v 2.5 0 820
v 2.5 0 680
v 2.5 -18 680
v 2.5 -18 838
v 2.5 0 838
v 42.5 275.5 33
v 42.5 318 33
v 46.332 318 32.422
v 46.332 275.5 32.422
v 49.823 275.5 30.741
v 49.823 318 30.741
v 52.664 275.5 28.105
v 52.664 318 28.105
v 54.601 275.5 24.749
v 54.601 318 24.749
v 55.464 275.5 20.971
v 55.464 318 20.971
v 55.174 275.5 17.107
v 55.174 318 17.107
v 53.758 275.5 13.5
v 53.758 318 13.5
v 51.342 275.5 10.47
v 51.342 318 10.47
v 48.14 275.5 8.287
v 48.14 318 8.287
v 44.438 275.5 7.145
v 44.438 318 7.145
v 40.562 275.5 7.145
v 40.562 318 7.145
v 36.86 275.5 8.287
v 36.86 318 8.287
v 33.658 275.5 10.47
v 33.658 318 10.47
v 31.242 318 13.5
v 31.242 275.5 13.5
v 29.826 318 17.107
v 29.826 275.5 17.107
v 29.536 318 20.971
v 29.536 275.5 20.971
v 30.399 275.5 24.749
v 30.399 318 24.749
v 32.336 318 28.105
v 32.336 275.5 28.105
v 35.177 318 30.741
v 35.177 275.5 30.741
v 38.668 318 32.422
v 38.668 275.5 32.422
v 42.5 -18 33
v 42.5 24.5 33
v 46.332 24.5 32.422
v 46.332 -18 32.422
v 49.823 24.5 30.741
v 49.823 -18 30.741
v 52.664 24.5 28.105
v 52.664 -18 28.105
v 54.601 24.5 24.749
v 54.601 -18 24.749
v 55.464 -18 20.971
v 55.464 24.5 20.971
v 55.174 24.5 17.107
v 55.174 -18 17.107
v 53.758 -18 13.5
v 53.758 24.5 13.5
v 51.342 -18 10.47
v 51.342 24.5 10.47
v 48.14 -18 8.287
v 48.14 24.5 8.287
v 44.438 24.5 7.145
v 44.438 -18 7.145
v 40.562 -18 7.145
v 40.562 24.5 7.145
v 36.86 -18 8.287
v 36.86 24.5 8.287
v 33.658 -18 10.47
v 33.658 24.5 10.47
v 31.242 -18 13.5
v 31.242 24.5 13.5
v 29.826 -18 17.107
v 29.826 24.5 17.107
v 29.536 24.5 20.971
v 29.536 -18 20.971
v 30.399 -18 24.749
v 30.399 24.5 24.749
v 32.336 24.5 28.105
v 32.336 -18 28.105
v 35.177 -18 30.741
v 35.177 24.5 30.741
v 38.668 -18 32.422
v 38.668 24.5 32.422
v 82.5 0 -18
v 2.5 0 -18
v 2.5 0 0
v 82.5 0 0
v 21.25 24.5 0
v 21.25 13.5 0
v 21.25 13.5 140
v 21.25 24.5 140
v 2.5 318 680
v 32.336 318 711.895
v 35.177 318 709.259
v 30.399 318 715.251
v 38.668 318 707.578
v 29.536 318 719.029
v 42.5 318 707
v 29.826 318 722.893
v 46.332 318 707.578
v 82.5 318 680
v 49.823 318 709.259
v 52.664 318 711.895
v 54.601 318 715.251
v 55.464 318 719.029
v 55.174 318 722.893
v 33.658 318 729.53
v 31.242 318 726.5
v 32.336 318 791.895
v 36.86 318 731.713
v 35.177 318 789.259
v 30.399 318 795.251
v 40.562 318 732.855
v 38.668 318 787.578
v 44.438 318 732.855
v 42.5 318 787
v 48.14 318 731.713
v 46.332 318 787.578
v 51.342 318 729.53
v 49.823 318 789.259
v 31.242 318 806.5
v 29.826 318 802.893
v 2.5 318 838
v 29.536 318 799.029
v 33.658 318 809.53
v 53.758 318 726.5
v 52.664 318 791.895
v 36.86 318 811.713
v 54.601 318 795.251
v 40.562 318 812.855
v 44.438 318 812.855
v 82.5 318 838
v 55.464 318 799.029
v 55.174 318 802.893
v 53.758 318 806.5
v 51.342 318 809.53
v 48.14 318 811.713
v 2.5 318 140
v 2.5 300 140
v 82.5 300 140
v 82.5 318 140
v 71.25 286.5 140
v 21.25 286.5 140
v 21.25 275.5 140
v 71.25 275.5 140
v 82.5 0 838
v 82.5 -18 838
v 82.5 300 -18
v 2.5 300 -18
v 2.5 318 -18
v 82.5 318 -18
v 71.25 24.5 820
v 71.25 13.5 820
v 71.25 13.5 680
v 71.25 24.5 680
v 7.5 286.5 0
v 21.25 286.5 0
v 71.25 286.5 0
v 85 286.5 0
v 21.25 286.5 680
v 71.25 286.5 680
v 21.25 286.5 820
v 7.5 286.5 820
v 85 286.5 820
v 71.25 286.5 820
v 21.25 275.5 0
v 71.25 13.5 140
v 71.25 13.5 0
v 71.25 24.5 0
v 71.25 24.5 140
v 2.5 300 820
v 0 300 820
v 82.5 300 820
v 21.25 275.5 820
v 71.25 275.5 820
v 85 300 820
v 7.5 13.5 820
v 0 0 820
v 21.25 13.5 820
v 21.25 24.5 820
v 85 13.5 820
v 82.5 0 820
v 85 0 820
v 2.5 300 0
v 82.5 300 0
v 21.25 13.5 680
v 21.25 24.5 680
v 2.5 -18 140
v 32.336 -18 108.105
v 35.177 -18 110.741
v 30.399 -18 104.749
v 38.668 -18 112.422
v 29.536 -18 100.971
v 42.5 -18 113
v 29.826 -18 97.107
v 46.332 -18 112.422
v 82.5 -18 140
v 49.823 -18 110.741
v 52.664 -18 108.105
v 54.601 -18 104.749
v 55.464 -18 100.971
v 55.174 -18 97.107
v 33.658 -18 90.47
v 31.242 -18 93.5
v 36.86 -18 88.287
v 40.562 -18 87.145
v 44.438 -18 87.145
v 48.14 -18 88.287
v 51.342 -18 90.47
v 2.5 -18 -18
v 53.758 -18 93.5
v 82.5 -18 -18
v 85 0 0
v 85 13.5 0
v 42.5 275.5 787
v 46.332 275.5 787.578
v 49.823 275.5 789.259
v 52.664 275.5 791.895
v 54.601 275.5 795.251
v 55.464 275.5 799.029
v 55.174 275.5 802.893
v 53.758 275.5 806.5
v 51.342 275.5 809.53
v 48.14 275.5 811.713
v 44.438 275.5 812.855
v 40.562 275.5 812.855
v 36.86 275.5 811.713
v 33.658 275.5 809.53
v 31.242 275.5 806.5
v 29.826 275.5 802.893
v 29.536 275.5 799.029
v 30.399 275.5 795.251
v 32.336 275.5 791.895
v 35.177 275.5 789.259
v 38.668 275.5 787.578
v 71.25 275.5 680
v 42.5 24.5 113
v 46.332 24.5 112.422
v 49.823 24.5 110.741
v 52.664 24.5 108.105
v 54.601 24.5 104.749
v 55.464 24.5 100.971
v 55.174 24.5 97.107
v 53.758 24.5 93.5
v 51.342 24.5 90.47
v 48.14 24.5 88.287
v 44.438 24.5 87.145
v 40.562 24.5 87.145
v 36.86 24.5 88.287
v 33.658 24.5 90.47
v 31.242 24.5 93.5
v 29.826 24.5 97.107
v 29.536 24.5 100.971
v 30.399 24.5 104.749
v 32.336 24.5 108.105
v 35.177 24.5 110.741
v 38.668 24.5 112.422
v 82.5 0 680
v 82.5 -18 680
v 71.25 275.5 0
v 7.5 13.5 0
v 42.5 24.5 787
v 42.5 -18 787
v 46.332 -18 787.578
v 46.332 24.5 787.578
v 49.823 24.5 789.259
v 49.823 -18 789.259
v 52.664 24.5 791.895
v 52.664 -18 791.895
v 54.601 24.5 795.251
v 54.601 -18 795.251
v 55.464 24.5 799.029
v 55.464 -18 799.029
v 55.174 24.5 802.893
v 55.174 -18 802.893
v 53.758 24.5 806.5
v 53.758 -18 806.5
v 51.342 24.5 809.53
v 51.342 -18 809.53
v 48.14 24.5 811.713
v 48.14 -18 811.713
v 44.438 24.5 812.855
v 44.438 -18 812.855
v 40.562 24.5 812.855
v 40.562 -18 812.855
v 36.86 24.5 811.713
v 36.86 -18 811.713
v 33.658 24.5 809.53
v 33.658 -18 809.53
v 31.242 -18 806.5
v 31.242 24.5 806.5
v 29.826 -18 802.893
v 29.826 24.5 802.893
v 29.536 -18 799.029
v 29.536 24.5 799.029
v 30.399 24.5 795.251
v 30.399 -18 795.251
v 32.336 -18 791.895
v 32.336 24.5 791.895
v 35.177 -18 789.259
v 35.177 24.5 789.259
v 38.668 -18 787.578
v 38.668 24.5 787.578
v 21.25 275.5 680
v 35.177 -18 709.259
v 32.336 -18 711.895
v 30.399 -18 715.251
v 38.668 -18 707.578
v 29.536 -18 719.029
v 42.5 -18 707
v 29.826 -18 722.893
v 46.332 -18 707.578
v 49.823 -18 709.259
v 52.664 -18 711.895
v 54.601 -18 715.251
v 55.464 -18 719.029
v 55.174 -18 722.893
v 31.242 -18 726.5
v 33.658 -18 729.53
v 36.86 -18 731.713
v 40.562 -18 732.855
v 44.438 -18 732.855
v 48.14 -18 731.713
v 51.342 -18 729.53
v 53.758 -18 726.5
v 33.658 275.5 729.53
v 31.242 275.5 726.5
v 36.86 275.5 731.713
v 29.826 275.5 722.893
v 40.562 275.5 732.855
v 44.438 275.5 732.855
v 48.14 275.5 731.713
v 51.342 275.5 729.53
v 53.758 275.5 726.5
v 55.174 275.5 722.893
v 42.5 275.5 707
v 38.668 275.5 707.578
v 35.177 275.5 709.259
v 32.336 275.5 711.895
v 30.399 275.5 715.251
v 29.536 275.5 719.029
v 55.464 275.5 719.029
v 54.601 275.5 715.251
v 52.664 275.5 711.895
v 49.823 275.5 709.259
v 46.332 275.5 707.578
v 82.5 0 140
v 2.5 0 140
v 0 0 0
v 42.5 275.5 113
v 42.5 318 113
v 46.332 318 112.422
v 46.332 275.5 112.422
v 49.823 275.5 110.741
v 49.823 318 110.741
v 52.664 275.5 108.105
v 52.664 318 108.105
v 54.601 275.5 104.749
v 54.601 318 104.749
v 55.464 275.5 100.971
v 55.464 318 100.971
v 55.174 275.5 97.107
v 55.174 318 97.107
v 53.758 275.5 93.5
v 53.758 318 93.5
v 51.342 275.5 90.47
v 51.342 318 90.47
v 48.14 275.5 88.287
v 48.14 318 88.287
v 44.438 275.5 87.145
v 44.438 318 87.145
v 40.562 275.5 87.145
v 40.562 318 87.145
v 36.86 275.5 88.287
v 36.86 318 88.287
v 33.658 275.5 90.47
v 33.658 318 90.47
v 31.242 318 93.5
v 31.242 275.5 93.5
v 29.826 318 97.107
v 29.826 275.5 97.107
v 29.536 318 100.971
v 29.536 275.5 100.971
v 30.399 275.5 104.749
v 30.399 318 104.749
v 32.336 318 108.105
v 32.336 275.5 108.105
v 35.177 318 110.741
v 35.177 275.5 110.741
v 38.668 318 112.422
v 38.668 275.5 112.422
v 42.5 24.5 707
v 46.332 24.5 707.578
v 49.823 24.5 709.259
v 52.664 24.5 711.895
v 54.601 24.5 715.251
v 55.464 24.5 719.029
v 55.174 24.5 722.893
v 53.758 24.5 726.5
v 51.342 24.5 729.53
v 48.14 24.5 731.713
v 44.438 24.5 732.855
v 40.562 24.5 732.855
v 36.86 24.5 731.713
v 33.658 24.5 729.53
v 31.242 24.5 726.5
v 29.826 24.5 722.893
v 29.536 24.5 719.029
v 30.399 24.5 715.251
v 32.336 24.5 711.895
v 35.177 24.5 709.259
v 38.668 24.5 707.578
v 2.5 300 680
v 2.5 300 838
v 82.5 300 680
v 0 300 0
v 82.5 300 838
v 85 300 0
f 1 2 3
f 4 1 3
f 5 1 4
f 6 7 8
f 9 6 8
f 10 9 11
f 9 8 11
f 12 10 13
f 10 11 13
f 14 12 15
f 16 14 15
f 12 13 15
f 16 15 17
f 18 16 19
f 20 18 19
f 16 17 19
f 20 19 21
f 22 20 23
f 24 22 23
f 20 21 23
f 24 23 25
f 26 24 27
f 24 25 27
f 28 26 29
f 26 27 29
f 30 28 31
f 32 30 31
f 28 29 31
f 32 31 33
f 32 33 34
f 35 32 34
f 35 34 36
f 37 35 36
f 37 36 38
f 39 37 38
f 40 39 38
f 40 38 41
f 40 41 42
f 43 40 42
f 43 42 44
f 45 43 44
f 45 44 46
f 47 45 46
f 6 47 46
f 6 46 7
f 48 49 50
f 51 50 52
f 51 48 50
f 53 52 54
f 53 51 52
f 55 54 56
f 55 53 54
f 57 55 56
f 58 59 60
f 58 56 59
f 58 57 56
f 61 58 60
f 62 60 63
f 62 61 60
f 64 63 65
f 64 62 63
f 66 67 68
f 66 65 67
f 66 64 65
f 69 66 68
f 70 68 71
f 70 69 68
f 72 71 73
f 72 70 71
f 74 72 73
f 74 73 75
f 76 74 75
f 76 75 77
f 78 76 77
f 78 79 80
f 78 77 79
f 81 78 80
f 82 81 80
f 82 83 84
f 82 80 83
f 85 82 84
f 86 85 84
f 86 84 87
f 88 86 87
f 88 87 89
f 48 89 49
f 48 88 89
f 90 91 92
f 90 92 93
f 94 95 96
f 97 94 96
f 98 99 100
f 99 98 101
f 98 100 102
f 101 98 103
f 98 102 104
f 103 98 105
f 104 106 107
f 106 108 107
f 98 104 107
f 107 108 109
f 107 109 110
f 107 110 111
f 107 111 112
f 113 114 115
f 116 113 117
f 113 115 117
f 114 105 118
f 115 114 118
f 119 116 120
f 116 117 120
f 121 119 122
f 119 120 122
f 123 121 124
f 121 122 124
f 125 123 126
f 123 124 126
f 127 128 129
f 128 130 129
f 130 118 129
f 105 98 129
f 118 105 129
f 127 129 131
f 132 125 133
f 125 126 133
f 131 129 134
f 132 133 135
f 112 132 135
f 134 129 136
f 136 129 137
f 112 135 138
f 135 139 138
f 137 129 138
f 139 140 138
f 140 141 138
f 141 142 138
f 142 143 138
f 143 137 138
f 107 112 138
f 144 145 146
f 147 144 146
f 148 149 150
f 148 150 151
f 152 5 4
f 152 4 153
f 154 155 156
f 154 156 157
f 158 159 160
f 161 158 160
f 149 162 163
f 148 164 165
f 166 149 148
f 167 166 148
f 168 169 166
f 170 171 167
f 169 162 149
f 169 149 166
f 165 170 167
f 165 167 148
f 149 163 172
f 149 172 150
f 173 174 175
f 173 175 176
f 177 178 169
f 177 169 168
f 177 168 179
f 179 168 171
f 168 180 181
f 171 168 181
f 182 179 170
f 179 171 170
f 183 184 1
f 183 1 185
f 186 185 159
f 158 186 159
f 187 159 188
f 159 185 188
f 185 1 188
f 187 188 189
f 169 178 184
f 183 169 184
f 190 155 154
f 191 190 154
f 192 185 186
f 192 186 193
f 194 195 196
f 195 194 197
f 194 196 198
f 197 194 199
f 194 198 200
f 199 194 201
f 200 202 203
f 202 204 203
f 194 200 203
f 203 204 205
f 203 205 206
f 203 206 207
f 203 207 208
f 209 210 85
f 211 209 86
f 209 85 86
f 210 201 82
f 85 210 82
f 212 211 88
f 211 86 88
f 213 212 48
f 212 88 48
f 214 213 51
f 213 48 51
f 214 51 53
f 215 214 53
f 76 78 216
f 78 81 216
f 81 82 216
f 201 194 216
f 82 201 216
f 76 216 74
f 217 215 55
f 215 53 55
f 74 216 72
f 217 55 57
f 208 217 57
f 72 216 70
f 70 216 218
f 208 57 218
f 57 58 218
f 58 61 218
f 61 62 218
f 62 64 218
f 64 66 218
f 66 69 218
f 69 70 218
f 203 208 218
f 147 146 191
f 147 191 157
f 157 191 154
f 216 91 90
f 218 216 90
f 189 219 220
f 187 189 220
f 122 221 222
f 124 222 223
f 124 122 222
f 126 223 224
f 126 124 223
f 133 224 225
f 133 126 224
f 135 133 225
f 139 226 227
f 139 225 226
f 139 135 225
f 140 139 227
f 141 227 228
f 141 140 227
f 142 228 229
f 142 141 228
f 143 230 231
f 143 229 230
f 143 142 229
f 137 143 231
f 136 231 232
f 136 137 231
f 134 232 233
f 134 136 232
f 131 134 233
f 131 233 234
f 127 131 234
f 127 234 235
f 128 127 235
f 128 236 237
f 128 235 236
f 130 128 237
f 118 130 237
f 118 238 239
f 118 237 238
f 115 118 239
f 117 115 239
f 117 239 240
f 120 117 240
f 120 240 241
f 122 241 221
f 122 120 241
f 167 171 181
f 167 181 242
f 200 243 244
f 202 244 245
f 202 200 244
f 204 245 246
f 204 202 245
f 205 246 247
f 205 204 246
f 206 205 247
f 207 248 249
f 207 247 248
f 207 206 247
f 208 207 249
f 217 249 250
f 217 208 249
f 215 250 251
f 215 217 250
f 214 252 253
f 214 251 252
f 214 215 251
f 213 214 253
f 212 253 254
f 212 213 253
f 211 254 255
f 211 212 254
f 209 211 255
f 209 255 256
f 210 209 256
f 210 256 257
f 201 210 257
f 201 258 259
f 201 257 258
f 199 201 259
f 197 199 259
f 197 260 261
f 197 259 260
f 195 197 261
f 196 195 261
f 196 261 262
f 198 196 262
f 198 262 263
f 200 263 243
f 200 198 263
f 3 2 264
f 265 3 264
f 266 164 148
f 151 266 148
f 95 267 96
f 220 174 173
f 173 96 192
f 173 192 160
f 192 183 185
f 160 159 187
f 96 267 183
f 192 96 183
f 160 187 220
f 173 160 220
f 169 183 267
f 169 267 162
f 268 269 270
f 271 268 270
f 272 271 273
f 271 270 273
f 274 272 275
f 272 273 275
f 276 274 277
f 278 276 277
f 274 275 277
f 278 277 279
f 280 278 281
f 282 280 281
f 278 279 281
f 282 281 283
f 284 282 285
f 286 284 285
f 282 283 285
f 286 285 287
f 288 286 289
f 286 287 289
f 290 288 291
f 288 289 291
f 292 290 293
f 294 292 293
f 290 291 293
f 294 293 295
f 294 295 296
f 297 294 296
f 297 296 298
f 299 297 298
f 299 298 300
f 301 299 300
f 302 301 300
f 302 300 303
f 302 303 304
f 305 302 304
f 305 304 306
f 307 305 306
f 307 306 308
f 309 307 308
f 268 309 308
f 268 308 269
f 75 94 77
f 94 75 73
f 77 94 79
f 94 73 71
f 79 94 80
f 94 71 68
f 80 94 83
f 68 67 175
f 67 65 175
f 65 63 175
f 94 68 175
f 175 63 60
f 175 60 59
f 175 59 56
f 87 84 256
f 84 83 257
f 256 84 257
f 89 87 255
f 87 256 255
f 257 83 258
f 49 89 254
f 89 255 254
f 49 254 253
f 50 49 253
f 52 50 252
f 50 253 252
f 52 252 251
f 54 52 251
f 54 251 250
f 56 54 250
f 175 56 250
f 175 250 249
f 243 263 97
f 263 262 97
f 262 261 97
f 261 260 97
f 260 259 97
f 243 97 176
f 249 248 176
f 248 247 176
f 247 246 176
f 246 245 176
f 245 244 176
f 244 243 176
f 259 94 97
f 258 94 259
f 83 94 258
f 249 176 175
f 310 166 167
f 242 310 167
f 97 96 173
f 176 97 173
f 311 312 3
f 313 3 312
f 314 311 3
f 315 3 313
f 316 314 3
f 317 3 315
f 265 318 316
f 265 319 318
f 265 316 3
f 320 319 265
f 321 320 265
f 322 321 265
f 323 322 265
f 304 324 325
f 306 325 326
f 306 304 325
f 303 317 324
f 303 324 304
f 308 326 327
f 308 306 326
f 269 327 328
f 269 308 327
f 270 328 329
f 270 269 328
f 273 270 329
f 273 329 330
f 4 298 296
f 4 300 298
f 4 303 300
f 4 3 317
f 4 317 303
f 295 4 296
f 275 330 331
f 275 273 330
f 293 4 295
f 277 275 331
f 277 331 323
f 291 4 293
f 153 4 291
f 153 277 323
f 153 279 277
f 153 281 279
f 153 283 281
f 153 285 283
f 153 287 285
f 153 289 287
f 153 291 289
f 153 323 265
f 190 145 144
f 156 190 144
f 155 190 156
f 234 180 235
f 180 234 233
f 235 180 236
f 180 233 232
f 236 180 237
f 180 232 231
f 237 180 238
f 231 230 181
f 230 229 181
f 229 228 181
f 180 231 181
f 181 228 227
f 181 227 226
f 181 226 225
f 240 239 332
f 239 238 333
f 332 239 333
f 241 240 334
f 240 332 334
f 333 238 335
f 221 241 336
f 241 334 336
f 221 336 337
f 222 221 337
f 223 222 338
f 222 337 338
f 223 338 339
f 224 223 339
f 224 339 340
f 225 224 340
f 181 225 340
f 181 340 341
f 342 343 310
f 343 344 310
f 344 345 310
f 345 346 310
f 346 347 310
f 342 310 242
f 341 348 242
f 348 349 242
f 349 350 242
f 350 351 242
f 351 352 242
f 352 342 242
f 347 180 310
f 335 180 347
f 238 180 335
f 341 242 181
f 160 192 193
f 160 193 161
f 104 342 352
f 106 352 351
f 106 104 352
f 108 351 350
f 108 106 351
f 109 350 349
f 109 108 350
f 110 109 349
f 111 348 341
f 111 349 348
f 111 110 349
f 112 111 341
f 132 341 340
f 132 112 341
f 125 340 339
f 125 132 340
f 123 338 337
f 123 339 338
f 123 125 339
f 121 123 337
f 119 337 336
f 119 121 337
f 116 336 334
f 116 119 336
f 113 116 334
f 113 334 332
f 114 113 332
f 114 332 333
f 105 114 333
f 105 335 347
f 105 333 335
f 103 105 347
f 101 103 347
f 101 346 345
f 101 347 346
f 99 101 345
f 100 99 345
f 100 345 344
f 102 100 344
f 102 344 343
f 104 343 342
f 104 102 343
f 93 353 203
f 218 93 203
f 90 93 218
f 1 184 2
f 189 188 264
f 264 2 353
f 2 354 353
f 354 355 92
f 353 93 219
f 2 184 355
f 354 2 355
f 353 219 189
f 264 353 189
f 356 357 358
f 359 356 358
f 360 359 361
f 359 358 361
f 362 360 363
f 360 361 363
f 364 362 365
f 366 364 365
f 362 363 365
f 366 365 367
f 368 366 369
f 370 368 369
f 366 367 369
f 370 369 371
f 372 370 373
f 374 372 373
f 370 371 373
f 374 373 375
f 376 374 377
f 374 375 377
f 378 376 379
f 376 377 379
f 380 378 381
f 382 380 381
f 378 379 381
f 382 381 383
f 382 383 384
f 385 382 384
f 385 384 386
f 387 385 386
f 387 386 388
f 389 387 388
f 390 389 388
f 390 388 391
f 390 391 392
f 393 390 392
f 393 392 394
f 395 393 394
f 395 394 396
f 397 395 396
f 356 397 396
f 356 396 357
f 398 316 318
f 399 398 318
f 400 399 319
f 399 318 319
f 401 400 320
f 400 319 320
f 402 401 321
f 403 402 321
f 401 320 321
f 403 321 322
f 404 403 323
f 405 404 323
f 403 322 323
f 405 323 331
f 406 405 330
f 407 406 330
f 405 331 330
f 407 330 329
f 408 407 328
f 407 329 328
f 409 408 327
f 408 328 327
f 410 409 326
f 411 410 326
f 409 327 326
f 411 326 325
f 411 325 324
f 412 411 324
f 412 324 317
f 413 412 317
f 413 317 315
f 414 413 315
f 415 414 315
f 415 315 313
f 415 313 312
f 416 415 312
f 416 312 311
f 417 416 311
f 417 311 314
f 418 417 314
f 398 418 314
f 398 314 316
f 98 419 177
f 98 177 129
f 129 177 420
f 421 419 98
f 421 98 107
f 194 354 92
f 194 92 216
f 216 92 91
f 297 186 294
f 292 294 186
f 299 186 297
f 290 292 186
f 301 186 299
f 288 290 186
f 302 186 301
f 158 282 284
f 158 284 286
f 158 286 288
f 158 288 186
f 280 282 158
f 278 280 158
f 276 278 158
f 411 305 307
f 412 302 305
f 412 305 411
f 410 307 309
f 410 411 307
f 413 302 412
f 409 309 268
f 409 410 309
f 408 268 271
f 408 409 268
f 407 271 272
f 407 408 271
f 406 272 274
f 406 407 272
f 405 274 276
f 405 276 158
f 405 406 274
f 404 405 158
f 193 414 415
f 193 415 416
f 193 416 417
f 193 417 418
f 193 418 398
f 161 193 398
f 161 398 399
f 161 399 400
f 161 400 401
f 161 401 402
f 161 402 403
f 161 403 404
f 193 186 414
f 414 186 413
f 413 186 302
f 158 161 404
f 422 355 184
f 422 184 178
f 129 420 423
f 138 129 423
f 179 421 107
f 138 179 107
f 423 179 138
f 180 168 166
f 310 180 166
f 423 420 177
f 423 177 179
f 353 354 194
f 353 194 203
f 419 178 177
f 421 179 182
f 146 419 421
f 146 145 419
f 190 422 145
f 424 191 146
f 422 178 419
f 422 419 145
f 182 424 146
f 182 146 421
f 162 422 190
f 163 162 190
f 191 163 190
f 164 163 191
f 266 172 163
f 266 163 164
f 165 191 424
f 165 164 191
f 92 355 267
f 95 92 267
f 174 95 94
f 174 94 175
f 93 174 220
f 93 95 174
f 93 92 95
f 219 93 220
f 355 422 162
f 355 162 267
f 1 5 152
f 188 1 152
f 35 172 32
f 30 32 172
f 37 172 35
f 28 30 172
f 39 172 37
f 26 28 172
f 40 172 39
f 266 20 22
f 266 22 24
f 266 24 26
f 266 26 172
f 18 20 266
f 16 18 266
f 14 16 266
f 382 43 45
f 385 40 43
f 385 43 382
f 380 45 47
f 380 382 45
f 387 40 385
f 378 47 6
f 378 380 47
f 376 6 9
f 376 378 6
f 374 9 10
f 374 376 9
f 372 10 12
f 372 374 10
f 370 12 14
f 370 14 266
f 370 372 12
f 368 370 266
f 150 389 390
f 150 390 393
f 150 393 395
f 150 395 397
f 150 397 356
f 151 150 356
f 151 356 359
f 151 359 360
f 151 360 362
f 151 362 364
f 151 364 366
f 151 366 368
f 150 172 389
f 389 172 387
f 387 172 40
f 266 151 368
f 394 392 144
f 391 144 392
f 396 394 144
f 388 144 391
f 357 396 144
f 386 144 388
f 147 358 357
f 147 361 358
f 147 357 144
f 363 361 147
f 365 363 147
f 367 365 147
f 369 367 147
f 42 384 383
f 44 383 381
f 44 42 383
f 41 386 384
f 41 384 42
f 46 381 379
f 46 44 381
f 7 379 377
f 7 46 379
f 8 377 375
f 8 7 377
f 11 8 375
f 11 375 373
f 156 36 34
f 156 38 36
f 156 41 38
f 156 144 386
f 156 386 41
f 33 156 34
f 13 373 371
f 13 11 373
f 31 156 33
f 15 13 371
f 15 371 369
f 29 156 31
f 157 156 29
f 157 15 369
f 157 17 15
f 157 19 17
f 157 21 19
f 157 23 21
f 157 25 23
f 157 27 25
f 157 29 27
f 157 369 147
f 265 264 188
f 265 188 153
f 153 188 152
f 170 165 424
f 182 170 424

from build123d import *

# Parameters (mm, degrees)
SKETCH_1_W               = 85
SKETCH_1_H               = 300
EXTRUDE_1_DEPTH          = 820
SKETCH_2_W               = 77.5
SKETCH_2_H               = 273
CUT_EXTRUDE_1_DEPTH      = 878.282736636
SKETCH_5_W               = 50
SKETCH_5_H               = 140
EXTRUDE_3_DEPTH          = 11
SKETCH_6_W               = 80
SKETCH_6_H               = 158
EXTRUDE_4_DEPTH          = 18
SKETCH_8_R               = 13
CUT_EXTRUDE_3_DEPTH      = 884.600022635
MIRROR_4_COPY_1_SKETCH_W = 50
MIRROR_4_COPY_1_SKETCH_H = 140
MIRROR_4_COPY_1_DEPTH    = 11
MIRROR_4_COPY_2_SKETCH_W = 80
MIRROR_4_COPY_2_SKETCH_H = 158
MIRROR_4_COPY_2_DEPTH    = 18
MIRROR_4_COPY_3_SKETCH_R = 13
MIRROR_4_COPY_3_DEPTH    = 884.600022635


with BuildPart() as part:
    # 草图1 → 凸台-拉伸1 (new body)
    with BuildSketch(Plane.XY):
        with Locations((42.5, 150)):
            Rectangle(SKETCH_1_W, SKETCH_1_H)
    extrude(amount=EXTRUDE_1_DEPTH)

    # 草图2 → 切除-拉伸1 (cut, through all)
    with BuildSketch(Plane.XY.offset(820)):
        with Locations((46.25, 150)):
            Rectangle(SKETCH_2_W, SKETCH_2_H)
    extrude(amount=-CUT_EXTRUDE_1_DEPTH, mode=Mode.SUBTRACT)

    # 草图5 → 凸台-拉伸3 (add)
    with BuildSketch(Plane.XZ.offset(-286.5)):
        with Locations((46.25, 70)):
            Rectangle(SKETCH_5_W, SKETCH_5_H)
    extrude_3 = extrude(amount=EXTRUDE_3_DEPTH)

    # 草图6 → 凸台-拉伸4 (add)
    with BuildSketch(Plane(origin=(0, 300, 0), x_dir=(1, 0, 0), z_dir=(0, 1, 0))):
        with Locations((42.5, -61)):
            Rectangle(SKETCH_6_W, SKETCH_6_H)
    extrude_4 = extrude(amount=EXTRUDE_4_DEPTH)

    # 草图8 → 切除-拉伸3 (cut, through all)
    with BuildSketch(Plane(origin=(0, 318, 0), x_dir=(1, 0, 0), z_dir=(0, 1, 0))):
        with Locations(Location((42.5, -20, 0), (0, 0, 270))):
            Circle(SKETCH_8_R)
        with Locations(Location((42.5, -100, 0), (0, 0, 270))):
            Circle(SKETCH_8_R)
    cut_extrude_3 = extrude(amount=-CUT_EXTRUDE_3_DEPTH, mode=Mode.SUBTRACT)

    # 镜向3: 凸台-拉伸3, 凸台-拉伸4, 切除-拉伸3 across plane
    add(extrude_3.mirror(Plane(origin=(0, 150, 0), x_dir=(0, 0, 1), z_dir=(0, -1, 0))))
    add(extrude_4.mirror(Plane(origin=(0, 150, 0), x_dir=(0, 0, 1), z_dir=(0, -1, 0))))
    add(cut_extrude_3.mirror(Plane(origin=(0, 150, 0), x_dir=(0, 0, 1), z_dir=(0, -1, 0))), mode=Mode.SUBTRACT)

    # 镜向4: 凸台-拉伸3, 凸台-拉伸4, 切除-拉伸3 across plane
    add(extrude_3.mirror(Plane(origin=(0, 0, 410), x_dir=(1, 0, 0), z_dir=(0, 0, -1))))
    add(extrude_4.mirror(Plane(origin=(0, 0, 410), x_dir=(1, 0, 0), z_dir=(0, 0, -1))))
    add(cut_extrude_3.mirror(Plane(origin=(0, 0, 410), x_dir=(1, 0, 0), z_dir=(0, 0, -1))), mode=Mode.SUBTRACT)

    # 镜向4 copy 1 sketch → 镜向4 copy 1 (add)
    with BuildSketch(Plane(origin=(0, 13.5, 820), x_dir=(1, 0, 0), z_dir=(0, 1, 0))):
        with Locations((46.25, 70)):
            Rectangle(MIRROR_4_COPY_1_SKETCH_W, MIRROR_4_COPY_1_SKETCH_H)
    extrude(amount=MIRROR_4_COPY_1_DEPTH)

    # 镜向4 copy 2 sketch → 镜向4 copy 2 (add)
    with BuildSketch(Plane(origin=(0, 0, 820), x_dir=(1, 0, 0), z_dir=(0, -1, 0))):
        with Locations((42.5, -61)):
            Rectangle(MIRROR_4_COPY_2_SKETCH_W, MIRROR_4_COPY_2_SKETCH_H)
    extrude(amount=MIRROR_4_COPY_2_DEPTH)

    # 镜向4 copy 3 sketch → 镜向4 copy 3 (cut, through all)
    with BuildSketch(Plane(origin=(0, -18, 820), x_dir=(1, 0, 0), z_dir=(0, -1, 0))):
        with Locations(Location((42.5, -20, 0), (0, 0, 270))):
            Circle(MIRROR_4_COPY_3_SKETCH_R)
        with Locations(Location((42.5, -100, 0), (0, 0, 270))):
            Circle(MIRROR_4_COPY_3_SKETCH_R)
    extrude(amount=-MIRROR_4_COPY_3_DEPTH, mode=Mode.SUBTRACT)


solid = part.part
